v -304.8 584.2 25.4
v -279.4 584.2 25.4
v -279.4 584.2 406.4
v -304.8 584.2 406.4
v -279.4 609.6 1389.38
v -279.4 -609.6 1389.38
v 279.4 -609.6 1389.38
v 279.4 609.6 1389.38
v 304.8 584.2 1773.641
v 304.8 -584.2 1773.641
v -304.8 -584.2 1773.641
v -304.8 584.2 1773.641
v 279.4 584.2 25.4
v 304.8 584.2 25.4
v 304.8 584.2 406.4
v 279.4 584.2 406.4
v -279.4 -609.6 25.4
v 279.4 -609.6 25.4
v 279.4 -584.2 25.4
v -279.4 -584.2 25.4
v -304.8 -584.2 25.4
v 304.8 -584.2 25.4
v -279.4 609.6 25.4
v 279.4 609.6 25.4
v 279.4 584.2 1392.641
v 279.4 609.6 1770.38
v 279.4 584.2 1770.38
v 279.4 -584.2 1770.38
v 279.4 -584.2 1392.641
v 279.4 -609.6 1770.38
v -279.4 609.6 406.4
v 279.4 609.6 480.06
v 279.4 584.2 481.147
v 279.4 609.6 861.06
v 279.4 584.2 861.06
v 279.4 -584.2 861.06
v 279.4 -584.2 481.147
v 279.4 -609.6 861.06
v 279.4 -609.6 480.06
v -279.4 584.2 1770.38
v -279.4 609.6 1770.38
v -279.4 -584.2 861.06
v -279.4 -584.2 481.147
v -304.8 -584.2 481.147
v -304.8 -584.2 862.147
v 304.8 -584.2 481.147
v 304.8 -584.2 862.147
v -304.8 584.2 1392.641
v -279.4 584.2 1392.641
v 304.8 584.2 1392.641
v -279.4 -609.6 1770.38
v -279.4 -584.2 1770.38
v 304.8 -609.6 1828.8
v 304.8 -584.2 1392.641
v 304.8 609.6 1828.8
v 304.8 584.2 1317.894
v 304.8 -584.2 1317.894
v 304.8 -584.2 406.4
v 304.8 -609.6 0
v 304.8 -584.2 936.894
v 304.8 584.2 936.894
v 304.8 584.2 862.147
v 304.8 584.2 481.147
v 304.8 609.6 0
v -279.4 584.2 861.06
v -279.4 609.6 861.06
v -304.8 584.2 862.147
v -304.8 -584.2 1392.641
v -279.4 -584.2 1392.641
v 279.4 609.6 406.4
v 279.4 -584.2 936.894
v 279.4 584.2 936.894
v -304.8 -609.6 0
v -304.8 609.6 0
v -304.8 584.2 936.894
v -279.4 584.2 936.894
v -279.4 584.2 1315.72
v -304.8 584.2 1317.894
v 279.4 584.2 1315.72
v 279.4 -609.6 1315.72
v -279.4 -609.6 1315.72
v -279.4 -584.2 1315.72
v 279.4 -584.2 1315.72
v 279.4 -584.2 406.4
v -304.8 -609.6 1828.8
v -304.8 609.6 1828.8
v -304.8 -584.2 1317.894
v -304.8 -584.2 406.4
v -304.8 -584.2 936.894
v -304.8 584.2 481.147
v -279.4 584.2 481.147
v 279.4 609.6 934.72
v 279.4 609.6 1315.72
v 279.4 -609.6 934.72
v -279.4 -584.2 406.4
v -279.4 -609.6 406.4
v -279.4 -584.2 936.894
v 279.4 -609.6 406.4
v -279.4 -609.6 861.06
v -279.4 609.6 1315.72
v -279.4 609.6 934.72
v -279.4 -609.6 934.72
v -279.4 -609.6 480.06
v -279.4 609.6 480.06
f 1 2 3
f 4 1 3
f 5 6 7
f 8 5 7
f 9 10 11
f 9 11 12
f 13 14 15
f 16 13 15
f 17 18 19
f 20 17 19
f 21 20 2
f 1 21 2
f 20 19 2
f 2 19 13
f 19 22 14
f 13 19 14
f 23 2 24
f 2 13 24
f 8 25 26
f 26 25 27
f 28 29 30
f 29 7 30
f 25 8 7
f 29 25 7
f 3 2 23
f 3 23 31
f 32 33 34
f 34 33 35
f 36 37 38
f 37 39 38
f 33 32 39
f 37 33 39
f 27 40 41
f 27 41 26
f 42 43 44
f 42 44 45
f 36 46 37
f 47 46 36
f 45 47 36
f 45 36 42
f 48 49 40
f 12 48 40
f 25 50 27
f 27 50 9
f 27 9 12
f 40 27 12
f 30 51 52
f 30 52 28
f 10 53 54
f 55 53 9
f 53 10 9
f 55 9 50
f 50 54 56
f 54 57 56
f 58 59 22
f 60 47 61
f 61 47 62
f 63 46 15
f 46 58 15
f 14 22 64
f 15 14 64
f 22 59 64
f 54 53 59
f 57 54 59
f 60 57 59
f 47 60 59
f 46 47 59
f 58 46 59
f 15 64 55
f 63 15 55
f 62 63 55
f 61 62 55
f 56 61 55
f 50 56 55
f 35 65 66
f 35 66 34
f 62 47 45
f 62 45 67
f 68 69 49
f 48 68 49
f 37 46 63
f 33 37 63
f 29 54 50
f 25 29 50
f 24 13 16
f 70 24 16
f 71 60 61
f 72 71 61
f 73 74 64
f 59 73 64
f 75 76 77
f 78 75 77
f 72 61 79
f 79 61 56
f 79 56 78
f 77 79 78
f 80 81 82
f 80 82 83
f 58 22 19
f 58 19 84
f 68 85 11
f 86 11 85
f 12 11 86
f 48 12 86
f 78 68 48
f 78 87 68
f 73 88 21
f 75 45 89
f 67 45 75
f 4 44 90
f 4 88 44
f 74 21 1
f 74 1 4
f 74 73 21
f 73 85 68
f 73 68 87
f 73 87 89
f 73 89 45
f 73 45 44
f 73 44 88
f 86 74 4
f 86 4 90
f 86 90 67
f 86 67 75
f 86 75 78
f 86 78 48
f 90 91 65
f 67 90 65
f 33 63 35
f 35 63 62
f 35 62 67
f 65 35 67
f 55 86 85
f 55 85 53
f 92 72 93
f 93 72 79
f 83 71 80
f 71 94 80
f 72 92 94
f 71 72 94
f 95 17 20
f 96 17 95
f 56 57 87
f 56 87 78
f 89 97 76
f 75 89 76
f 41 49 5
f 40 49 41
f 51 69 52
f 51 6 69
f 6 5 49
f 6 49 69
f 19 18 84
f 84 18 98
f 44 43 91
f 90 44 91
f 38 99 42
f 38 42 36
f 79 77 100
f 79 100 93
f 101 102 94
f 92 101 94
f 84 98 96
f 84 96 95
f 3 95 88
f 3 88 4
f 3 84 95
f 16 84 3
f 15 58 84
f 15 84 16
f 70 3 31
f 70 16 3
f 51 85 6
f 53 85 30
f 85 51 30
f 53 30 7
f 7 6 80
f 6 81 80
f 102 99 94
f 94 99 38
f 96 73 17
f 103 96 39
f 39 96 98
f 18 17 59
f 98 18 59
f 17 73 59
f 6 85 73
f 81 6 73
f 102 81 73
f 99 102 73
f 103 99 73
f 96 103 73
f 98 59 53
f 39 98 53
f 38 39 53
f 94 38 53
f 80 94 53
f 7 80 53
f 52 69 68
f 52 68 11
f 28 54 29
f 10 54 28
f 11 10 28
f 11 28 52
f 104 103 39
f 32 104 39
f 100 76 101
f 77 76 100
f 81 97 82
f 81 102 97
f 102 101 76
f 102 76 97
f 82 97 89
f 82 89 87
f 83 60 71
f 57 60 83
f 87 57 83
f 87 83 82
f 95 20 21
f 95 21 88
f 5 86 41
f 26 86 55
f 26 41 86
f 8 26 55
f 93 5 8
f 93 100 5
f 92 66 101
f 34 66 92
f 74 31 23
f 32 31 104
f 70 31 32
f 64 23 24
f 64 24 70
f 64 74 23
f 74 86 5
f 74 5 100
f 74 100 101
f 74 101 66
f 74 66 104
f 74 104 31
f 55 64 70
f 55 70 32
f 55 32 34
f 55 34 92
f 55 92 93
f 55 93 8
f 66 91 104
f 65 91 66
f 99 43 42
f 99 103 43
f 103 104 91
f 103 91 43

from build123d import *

# Parameters (mm, degrees)
F0_W     = 609.6
F0_H     = 1219.2
F1_DEPTH = 1828.8
F2_W     = 1168.4
F2_H     = 381
F3_DEPTH = 609.601
F4_W     = 558.8
F4_H     = 381
F5_DEPTH = 1219.201


with BuildPart() as f1:
    # F0 (on Top) → F1 (new body)
    with BuildSketch(Plane.XY):
        Rectangle(F0_W, F0_H)
    extrude(amount=F1_DEPTH)

    # F2 (on face) → F3 (cut, through all)
    with BuildSketch(Plane.YZ.offset(304.8)):
        with Locations((0, 215.9)):
            Rectangle(F2_W, F2_H)
        with Locations((0, 671.647025)):
            Rectangle(F2_W, F2_H)
        with Locations((0, 1127.394051)):
            Rectangle(F2_W, F2_H)
        with Locations((0, 1583.141076)):
            Rectangle(F2_W, F2_H)
    extrude(amount=-F3_DEPTH, mode=Mode.SUBTRACT)

    # F4 (on face) → F5 (cut, through all)
    with BuildSketch(Plane.XZ.offset(609.6)):
        with Locations((0, 215.9)):
            Rectangle(F4_W, F4_H)
        with Locations((0, 670.56)):
            Rectangle(F4_W, F4_H)
        with Locations((0, 1125.22)):
            Rectangle(F4_W, F4_H)
        with Locations((0, 1579.88)):
            Rectangle(F4_W, F4_H)
    extrude(amount=-F5_DEPTH, mode=Mode.SUBTRACT)


solid = f1.part
